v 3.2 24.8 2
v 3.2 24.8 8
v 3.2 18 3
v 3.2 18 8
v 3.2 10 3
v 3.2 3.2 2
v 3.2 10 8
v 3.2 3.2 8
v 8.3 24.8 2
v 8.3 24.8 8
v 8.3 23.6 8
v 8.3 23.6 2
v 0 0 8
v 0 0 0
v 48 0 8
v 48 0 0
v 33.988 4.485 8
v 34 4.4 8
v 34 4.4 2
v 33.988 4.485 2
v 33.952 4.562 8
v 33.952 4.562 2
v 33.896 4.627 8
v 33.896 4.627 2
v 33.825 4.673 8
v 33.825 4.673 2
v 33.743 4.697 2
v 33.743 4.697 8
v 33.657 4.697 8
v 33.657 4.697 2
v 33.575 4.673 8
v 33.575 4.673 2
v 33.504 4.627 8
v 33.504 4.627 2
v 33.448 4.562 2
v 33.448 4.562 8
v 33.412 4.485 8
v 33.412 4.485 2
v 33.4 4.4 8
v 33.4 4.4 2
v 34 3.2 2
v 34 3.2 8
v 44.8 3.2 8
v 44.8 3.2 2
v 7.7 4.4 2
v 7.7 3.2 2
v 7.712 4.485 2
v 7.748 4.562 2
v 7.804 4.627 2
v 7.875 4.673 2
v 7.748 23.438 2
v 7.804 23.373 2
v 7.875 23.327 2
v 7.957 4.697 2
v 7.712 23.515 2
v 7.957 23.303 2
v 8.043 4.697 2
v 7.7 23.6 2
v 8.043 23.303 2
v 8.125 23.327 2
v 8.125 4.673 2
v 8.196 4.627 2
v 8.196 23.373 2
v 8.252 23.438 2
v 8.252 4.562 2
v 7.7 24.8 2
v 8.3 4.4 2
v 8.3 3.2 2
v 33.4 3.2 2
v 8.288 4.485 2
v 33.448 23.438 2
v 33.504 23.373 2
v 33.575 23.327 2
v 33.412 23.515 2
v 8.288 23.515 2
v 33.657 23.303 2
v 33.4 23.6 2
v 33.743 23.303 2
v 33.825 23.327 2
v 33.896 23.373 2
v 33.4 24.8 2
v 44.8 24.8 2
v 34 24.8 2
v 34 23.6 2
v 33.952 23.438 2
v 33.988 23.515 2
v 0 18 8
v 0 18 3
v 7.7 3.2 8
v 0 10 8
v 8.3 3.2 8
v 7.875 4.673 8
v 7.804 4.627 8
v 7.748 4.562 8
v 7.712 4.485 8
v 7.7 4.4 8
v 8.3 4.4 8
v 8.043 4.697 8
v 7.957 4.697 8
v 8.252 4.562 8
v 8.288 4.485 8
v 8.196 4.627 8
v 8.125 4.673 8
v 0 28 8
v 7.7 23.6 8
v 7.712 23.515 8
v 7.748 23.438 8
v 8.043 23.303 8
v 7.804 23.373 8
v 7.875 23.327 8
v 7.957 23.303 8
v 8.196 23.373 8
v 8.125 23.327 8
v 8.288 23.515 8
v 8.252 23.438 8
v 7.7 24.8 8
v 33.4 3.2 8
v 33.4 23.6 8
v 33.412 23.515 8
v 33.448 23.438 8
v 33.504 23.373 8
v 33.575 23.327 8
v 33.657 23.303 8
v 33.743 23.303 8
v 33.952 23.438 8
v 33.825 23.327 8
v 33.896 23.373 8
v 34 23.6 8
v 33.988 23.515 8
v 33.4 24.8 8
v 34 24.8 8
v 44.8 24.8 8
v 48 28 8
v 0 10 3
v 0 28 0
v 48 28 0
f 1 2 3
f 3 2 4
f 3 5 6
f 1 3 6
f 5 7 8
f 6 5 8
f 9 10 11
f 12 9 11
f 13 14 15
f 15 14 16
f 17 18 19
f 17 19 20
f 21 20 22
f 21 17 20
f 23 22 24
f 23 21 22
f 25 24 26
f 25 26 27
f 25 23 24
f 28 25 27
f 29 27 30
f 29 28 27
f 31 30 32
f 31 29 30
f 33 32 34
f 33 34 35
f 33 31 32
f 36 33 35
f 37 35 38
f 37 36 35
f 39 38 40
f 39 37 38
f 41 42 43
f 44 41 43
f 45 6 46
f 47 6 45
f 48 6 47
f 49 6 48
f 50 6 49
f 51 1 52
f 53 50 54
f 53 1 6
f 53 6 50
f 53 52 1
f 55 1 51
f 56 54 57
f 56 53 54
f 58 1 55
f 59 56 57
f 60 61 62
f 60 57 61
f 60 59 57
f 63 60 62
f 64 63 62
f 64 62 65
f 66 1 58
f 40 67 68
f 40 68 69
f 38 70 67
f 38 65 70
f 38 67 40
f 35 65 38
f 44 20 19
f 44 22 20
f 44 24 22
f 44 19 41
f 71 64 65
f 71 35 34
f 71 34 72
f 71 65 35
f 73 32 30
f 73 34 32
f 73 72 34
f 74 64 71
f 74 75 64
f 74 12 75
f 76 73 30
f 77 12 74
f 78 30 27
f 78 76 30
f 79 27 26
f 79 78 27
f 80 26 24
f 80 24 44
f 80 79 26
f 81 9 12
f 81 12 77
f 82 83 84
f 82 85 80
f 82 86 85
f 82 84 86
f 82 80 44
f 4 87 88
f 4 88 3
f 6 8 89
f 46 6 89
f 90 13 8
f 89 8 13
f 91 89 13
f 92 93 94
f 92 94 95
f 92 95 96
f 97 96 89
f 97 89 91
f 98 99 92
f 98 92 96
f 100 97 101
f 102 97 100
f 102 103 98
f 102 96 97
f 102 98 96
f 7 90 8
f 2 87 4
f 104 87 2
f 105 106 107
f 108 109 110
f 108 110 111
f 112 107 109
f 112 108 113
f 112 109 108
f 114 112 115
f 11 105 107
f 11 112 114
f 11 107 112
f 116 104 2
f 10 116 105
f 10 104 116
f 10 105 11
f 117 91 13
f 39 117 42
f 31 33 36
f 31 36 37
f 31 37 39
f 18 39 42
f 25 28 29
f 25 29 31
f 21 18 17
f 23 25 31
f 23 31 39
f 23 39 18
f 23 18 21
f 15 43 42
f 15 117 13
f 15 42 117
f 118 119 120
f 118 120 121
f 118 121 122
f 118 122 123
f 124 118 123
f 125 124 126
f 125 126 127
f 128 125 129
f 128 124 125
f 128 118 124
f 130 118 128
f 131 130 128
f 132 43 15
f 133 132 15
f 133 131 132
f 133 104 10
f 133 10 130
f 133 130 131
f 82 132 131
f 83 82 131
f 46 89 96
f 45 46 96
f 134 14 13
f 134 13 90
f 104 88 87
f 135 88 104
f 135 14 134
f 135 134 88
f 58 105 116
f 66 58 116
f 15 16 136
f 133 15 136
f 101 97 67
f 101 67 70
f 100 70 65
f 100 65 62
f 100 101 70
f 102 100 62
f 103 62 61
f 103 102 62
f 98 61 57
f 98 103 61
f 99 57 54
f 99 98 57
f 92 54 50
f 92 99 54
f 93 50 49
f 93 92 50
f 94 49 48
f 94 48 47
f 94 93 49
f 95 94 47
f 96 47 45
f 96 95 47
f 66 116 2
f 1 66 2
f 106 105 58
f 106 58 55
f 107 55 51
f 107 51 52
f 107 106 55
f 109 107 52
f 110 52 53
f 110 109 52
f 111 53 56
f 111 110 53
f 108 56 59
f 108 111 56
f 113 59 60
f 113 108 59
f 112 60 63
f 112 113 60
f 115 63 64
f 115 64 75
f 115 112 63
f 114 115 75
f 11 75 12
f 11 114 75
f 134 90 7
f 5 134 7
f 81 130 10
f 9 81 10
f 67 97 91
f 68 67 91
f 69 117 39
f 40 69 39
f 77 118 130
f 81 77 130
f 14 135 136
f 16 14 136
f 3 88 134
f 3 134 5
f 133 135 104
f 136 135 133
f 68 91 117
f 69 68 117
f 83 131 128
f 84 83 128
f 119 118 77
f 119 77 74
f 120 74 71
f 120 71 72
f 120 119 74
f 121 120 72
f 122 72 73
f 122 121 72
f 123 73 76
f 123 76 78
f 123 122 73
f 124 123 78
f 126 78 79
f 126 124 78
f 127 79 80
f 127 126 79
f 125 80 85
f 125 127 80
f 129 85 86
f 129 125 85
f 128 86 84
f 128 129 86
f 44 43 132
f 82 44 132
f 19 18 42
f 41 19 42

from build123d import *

# Parameters (mm, degrees)
SKETCH_W        = 48
SKETCH_H        = 28
PAD_DEPTH       = 8
POCKET_DEPTH    = 6
SKETCH002_W     = 4
SKETCH002_H     = 8
POCKET001_DEPTH = 5


with BuildPart() as part:
    # Sketch → Pad (new body)
    with BuildSketch(Plane.XY):
        with Locations((24, 14)):
            Rectangle(SKETCH_W, SKETCH_H)
    extrude(amount=PAD_DEPTH)

    # Sketch001 → Pocket (cut)
    with BuildSketch(Plane.XY.offset(8)):
        with BuildLine():
            Line((3.2, 3.2), (7.7, 3.2))
            Line((7.7, 3.2), (7.7, 4.4))
            ThreePointArc((8.3, 4.4), (8, 4.7), (7.7, 4.4))
            Line((8.3, 4.4), (8.3, 3.2))
            Line((8.3, 3.2), (33.4, 3.2))
            Line((33.4, 3.2), (33.4, 4.4))
            ThreePointArc((34, 4.4), (33.7, 4.7), (33.4, 4.4))
            Line((34, 4.4), (34, 3.2))
            Line((34, 3.2), (44.8, 3.2))
            Line((44.8, 3.2), (44.8, 24.8))
            Line((44.8, 24.8), (34, 24.8))
            Line((34, 24.8), (34, 23.6))
            ThreePointArc((33.4, 23.6), (33.7, 23.3), (34, 23.6))
            Line((33.4, 23.6), (33.4, 24.8))
            Line((33.4, 24.8), (8.3, 24.8))
            Line((8.3, 24.8), (8.3, 23.6))
            ThreePointArc((7.7, 23.6), (8, 23.3), (8.3, 23.6))
            Line((7.7, 23.6), (7.7, 24.8))
            Line((7.7, 24.8), (3.2, 24.8))
            Line((3.2, 24.8), (3.2, 3.2))
        make_face()
    extrude(amount=-POCKET_DEPTH, mode=Mode.SUBTRACT)

    # Sketch002 → Pocket001 (cut)
    with BuildSketch(Plane.XY.offset(8)):
        with Locations((2, 14)):
            Rectangle(SKETCH002_W, SKETCH002_H)
    extrude(amount=-POCKET001_DEPTH, mode=Mode.SUBTRACT)


solid = part.part
